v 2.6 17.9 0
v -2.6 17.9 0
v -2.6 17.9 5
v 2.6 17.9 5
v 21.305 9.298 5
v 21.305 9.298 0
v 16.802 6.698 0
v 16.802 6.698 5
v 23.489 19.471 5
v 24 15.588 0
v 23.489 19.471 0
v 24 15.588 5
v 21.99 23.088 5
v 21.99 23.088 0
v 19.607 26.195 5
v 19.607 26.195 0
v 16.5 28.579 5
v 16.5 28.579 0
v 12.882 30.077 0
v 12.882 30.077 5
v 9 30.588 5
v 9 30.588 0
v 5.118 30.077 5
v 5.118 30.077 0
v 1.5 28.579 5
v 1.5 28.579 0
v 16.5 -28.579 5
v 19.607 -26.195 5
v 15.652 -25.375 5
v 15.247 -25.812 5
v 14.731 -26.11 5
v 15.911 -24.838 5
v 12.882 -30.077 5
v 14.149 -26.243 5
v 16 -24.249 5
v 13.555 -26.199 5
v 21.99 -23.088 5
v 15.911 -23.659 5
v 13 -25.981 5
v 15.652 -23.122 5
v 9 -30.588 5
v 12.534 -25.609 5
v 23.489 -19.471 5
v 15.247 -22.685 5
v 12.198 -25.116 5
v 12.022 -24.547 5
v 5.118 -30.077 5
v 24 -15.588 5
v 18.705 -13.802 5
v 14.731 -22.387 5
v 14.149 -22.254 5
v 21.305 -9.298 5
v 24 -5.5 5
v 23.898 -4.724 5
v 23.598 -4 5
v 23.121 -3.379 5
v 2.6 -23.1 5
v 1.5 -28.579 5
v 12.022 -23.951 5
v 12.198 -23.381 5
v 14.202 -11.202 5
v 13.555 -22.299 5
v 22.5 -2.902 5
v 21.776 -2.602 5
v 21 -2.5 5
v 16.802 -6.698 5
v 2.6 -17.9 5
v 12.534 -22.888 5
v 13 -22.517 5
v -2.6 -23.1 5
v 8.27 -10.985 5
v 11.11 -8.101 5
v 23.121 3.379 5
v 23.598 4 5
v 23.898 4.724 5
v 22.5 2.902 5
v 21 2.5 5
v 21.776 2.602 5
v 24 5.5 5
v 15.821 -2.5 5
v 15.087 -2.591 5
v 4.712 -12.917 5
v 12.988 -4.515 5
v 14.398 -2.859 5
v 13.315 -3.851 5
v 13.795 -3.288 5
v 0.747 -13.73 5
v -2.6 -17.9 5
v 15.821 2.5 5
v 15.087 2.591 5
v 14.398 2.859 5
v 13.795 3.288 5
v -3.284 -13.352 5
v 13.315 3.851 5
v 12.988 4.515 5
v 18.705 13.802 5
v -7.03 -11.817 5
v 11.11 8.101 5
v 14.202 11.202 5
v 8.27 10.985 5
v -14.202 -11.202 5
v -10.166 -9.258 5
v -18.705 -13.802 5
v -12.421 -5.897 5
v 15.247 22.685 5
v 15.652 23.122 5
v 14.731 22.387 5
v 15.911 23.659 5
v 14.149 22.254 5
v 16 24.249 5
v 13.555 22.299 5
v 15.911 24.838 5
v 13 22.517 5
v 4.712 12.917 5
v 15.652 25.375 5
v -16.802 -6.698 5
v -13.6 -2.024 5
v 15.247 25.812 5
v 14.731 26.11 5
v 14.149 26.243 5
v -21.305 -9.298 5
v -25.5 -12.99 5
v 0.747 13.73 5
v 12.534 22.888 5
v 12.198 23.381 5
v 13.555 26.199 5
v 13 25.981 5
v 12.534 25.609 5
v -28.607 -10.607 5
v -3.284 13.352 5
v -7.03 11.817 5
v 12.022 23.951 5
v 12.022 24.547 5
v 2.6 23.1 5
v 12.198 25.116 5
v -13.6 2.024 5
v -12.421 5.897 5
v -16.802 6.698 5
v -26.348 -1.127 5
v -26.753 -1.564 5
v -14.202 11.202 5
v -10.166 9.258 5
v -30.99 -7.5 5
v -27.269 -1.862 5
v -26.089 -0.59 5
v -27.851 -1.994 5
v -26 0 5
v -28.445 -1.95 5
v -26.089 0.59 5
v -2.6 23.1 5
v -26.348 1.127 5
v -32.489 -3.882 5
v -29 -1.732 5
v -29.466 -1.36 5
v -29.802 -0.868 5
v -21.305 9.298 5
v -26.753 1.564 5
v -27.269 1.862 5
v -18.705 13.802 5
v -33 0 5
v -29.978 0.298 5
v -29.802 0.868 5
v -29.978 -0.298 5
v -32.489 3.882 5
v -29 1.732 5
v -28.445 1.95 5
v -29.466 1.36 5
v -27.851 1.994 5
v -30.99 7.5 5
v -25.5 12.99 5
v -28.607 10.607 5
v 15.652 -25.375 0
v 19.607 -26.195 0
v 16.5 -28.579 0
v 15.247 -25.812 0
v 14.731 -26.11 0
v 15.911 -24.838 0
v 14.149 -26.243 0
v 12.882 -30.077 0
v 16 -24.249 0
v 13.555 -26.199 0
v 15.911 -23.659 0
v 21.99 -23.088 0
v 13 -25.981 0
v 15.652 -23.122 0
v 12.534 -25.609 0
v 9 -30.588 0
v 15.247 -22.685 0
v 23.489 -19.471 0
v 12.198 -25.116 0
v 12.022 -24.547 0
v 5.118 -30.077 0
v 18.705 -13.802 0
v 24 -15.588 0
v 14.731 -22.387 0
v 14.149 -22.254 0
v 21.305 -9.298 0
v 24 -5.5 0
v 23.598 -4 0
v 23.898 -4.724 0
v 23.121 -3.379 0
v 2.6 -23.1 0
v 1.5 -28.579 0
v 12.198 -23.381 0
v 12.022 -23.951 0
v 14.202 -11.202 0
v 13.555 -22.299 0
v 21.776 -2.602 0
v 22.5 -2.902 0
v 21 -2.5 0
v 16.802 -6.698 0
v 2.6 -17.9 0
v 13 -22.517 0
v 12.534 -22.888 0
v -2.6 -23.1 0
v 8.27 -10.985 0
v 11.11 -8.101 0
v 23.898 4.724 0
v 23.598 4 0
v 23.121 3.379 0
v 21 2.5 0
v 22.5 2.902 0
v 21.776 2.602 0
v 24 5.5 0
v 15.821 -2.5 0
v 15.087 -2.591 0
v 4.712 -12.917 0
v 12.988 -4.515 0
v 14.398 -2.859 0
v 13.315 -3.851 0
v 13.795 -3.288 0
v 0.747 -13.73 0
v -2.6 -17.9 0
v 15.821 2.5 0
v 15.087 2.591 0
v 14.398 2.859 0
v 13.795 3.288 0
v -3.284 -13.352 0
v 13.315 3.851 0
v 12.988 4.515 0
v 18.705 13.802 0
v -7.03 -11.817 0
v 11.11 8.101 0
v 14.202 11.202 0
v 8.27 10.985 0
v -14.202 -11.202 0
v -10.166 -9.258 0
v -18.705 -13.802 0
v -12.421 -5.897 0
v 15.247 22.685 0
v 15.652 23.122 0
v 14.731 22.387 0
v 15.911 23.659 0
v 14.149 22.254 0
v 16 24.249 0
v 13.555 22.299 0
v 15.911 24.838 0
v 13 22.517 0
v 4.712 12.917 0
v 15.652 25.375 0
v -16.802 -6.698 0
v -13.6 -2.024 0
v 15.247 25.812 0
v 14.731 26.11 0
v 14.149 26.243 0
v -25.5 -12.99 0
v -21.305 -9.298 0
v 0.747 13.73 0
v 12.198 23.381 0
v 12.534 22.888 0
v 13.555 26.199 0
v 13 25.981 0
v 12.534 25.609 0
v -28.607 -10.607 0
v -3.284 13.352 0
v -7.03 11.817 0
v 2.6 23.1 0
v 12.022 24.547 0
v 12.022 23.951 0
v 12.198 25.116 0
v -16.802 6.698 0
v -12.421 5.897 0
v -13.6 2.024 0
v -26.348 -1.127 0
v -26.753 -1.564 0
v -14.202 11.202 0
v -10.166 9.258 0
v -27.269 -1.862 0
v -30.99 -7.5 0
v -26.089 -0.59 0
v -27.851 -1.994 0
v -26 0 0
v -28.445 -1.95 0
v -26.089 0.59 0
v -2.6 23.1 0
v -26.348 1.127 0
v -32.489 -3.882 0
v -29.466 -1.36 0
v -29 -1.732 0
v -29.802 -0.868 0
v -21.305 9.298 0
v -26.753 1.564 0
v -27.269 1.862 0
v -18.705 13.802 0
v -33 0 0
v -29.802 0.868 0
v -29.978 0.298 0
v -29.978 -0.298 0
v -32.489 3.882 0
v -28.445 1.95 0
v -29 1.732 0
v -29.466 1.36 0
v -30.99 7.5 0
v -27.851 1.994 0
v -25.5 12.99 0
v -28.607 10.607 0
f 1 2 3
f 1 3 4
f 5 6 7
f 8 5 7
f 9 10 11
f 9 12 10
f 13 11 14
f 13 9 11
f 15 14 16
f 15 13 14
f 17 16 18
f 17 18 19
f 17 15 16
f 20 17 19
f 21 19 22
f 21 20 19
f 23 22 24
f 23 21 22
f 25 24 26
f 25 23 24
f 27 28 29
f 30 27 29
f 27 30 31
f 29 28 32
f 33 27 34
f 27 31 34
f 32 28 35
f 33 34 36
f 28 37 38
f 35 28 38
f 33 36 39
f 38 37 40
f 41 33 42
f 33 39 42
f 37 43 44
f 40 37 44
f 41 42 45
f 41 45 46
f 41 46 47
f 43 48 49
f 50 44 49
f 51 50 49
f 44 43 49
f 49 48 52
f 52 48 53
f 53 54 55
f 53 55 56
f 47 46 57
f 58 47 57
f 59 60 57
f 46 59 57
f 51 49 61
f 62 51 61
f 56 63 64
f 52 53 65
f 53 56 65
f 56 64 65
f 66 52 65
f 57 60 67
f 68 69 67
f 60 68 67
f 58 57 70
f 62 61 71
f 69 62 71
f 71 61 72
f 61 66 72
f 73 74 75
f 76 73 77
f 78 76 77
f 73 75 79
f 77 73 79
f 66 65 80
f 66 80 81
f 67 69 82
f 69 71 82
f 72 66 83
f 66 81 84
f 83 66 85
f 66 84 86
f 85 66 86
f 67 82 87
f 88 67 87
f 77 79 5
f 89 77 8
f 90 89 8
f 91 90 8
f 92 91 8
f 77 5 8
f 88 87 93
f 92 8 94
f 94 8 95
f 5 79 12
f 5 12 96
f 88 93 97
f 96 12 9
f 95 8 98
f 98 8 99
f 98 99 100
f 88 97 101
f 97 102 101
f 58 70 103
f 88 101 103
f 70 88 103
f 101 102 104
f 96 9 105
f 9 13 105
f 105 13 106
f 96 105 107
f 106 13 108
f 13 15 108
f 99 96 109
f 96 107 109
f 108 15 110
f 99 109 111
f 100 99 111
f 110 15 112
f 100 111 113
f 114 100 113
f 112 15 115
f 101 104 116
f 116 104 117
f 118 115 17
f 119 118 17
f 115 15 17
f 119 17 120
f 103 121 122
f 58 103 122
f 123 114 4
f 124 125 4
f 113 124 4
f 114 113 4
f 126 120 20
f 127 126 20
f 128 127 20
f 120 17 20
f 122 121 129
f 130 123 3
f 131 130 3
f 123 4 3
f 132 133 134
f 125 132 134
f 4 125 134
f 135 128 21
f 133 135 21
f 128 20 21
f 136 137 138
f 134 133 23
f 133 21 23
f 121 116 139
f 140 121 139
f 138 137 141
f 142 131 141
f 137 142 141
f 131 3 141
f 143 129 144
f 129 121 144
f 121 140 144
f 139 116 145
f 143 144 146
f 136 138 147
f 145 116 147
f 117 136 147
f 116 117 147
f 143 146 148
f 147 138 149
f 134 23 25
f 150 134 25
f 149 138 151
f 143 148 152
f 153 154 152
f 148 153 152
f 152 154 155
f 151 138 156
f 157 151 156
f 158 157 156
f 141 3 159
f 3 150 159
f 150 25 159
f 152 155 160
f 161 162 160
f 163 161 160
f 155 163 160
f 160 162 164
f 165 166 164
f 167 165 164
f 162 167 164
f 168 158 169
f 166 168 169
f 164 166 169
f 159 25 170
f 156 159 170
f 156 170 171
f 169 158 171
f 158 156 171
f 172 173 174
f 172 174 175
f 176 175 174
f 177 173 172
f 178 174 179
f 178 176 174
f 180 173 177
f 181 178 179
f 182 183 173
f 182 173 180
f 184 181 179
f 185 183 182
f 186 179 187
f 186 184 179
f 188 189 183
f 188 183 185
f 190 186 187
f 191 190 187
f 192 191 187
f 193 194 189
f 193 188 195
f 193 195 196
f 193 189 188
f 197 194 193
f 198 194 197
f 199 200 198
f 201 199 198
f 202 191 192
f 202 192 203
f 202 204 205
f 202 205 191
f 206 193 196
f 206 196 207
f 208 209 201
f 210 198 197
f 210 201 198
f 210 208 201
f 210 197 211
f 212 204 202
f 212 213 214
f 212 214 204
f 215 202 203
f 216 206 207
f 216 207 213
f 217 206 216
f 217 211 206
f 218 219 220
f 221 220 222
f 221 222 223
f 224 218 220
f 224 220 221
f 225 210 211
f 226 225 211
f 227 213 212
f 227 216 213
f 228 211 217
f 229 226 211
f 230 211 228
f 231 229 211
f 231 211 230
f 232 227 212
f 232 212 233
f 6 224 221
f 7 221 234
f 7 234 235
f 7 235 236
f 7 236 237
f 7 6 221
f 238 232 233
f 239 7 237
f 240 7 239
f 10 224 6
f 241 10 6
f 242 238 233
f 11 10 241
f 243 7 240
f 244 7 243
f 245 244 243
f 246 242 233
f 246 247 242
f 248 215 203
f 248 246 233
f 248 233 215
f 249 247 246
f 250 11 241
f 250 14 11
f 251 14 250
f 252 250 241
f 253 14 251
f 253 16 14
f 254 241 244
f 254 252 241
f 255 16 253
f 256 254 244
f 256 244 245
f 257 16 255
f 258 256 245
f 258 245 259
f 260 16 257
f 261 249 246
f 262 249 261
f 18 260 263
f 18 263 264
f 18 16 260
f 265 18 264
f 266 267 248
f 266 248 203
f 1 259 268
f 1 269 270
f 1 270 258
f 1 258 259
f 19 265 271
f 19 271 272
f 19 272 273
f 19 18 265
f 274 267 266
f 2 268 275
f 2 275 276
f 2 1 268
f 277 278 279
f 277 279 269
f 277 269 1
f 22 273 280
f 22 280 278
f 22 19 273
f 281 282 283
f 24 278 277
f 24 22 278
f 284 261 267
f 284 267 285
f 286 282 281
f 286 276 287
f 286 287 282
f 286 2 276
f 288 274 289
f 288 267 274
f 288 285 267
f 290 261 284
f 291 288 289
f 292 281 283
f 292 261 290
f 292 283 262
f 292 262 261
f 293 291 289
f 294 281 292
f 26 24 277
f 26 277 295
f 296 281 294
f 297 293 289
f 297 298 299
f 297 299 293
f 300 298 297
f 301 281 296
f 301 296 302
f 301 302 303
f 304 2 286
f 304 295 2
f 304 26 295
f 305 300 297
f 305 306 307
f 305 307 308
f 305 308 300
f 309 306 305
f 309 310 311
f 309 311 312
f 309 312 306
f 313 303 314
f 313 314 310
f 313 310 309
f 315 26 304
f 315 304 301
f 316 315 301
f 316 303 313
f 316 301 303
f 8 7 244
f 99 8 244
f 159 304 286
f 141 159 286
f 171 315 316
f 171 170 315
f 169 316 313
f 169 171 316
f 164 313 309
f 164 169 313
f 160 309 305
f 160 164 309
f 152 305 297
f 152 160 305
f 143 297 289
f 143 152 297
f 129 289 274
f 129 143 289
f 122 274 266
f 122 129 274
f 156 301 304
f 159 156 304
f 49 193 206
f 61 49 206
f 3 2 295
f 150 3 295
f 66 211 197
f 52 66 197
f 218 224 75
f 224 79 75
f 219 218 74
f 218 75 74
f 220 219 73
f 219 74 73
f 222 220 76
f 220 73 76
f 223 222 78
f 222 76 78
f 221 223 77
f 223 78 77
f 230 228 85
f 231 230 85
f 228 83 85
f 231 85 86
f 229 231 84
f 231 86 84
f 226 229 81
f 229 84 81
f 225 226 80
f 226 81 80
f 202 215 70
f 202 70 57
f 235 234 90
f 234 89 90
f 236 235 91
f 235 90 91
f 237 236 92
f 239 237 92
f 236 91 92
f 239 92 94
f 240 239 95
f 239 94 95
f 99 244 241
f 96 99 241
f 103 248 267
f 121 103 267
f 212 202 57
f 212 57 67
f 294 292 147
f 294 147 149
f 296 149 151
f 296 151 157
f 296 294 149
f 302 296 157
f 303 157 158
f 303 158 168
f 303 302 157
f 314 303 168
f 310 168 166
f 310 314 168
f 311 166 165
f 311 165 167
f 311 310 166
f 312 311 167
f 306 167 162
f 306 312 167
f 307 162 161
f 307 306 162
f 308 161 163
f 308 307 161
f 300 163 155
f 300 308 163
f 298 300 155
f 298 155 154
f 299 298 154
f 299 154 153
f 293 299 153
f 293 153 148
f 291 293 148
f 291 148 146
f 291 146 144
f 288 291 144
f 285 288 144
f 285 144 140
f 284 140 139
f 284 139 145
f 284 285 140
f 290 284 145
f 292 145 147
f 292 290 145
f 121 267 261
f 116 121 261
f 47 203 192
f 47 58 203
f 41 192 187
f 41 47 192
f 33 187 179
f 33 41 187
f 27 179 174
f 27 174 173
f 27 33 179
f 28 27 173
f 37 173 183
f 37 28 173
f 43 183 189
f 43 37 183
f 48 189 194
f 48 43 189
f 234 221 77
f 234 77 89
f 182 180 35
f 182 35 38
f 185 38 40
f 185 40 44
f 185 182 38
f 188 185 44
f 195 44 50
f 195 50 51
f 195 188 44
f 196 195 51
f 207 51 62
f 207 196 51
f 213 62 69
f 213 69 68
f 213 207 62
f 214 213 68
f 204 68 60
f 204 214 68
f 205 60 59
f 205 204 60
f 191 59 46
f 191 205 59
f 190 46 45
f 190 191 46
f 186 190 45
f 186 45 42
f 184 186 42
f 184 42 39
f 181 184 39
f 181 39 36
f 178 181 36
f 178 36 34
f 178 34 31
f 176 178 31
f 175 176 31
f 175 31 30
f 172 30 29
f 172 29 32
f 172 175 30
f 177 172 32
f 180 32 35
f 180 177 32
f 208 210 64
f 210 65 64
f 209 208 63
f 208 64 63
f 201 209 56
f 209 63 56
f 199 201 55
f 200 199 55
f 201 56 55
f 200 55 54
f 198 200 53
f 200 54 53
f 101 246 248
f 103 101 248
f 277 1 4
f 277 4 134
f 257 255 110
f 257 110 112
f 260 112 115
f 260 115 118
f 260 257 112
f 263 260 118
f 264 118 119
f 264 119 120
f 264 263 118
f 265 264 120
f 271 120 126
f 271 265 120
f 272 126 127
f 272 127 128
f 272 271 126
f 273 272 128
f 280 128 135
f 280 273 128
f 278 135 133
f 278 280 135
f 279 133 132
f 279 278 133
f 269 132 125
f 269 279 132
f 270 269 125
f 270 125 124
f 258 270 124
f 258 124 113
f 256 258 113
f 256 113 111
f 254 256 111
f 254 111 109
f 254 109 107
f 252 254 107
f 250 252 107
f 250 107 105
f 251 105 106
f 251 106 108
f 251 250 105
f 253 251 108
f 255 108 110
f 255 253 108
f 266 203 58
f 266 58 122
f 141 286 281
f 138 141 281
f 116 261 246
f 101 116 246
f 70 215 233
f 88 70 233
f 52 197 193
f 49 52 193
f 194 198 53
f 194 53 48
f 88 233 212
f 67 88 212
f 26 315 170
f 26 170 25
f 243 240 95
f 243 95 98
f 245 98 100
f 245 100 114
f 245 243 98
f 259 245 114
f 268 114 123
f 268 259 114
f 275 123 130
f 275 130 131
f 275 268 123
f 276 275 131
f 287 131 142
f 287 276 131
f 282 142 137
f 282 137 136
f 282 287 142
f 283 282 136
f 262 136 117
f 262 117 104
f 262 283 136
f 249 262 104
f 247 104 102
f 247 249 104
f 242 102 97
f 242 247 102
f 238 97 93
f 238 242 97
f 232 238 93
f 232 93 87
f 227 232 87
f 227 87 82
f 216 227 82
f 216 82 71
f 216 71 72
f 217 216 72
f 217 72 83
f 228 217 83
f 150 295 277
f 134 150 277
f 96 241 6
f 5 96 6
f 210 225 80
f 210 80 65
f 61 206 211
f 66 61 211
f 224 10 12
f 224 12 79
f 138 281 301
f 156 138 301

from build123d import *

# Parameters (mm, degrees)
SKETCH1_R           = 2
SKETCH1_W           = 5.2
SKETCH1_H           = 5.2
BOSS_EXTRUDE1_DEPTH = 5
CONG_1_R            = 15
CONG_2_R            = 3


with BuildPart() as part:
    # Sketch1 → Boss-Extrude1 (new body)
    with BuildSketch(Plane.XY):
        with BuildLine():
            Line((24, 2.5), (13.520817283, 2.5))
            ThreePointArc((13.520817283, 2.5), (-13.75, 0), (13.520817283, -2.5))
            Line((13.520817283, -2.5), (24, -2.5))
            Line((24, -2.5), (24, -41.569219382))
            Line((24, -41.569219382), (-48, 0))
            Line((-48, 0), (24, 41.569219382))
            Line((24, 41.569219382), (24, 2.5))
        make_face()
        with Locations((14, 24.248711306)):
            Circle(SKETCH1_R, mode=Mode.SUBTRACT)
        with Locations((14, -24.248711306)):
            Circle(SKETCH1_R, mode=Mode.SUBTRACT)
        with Locations((-28, 0)):
            Circle(SKETCH1_R, mode=Mode.SUBTRACT)
        with Locations((0, 20.5)):
            Rectangle(SKETCH1_W, SKETCH1_H, mode=Mode.SUBTRACT)
        Polygon((21.305186827, 9.29833395), (16.801854728, 6.69833395), (14.201854728, 11.20166605), (18.705186827, 13.80166605), align=None, mode=Mode.SUBTRACT)
        Polygon((18.705186827, -13.80166605), (14.201854728, -11.20166605), (16.801854728, -6.69833395), (21.305186827, -9.29833395), align=None, mode=Mode.SUBTRACT)
        with Locations((0, -20.5)):
            Rectangle(SKETCH1_W, SKETCH1_H, mode=Mode.SUBTRACT)
        Polygon((-21.305186827, -9.29833395), (-16.801854728, -6.69833395), (-14.201854728, -11.20166605), (-18.705186827, -13.80166605), align=None, mode=Mode.SUBTRACT)
        Polygon((-18.705186827, 13.80166605), (-14.201854728, 11.20166605), (-16.801854728, 6.69833395), (-21.305186827, 9.29833395), align=None, mode=Mode.SUBTRACT)
    extrude(amount=BOSS_EXTRUDE1_DEPTH)

    # Congé1
    cong_1_edges = [part.edges().sort_by_distance(p)[0] for p in [
        (24, -41.569219382, 2.5),
        (-48, 0, 2.5),
        (24, 41.569219382, 2.5),
    ]]
    fillet(cong_1_edges, radius=CONG_1_R)

    # Congé2
    cong_2_edges = [part.edges().sort_by_distance(p)[0] for p in [
        (24, 2.5, 2.5),
        (13.520817283, 2.5, 2.5),
        (13.520817283, -2.5, 2.5),
        (24, -2.5, 2.5),
    ]]
    fillet(cong_2_edges, radius=CONG_2_R)


solid = part.part
